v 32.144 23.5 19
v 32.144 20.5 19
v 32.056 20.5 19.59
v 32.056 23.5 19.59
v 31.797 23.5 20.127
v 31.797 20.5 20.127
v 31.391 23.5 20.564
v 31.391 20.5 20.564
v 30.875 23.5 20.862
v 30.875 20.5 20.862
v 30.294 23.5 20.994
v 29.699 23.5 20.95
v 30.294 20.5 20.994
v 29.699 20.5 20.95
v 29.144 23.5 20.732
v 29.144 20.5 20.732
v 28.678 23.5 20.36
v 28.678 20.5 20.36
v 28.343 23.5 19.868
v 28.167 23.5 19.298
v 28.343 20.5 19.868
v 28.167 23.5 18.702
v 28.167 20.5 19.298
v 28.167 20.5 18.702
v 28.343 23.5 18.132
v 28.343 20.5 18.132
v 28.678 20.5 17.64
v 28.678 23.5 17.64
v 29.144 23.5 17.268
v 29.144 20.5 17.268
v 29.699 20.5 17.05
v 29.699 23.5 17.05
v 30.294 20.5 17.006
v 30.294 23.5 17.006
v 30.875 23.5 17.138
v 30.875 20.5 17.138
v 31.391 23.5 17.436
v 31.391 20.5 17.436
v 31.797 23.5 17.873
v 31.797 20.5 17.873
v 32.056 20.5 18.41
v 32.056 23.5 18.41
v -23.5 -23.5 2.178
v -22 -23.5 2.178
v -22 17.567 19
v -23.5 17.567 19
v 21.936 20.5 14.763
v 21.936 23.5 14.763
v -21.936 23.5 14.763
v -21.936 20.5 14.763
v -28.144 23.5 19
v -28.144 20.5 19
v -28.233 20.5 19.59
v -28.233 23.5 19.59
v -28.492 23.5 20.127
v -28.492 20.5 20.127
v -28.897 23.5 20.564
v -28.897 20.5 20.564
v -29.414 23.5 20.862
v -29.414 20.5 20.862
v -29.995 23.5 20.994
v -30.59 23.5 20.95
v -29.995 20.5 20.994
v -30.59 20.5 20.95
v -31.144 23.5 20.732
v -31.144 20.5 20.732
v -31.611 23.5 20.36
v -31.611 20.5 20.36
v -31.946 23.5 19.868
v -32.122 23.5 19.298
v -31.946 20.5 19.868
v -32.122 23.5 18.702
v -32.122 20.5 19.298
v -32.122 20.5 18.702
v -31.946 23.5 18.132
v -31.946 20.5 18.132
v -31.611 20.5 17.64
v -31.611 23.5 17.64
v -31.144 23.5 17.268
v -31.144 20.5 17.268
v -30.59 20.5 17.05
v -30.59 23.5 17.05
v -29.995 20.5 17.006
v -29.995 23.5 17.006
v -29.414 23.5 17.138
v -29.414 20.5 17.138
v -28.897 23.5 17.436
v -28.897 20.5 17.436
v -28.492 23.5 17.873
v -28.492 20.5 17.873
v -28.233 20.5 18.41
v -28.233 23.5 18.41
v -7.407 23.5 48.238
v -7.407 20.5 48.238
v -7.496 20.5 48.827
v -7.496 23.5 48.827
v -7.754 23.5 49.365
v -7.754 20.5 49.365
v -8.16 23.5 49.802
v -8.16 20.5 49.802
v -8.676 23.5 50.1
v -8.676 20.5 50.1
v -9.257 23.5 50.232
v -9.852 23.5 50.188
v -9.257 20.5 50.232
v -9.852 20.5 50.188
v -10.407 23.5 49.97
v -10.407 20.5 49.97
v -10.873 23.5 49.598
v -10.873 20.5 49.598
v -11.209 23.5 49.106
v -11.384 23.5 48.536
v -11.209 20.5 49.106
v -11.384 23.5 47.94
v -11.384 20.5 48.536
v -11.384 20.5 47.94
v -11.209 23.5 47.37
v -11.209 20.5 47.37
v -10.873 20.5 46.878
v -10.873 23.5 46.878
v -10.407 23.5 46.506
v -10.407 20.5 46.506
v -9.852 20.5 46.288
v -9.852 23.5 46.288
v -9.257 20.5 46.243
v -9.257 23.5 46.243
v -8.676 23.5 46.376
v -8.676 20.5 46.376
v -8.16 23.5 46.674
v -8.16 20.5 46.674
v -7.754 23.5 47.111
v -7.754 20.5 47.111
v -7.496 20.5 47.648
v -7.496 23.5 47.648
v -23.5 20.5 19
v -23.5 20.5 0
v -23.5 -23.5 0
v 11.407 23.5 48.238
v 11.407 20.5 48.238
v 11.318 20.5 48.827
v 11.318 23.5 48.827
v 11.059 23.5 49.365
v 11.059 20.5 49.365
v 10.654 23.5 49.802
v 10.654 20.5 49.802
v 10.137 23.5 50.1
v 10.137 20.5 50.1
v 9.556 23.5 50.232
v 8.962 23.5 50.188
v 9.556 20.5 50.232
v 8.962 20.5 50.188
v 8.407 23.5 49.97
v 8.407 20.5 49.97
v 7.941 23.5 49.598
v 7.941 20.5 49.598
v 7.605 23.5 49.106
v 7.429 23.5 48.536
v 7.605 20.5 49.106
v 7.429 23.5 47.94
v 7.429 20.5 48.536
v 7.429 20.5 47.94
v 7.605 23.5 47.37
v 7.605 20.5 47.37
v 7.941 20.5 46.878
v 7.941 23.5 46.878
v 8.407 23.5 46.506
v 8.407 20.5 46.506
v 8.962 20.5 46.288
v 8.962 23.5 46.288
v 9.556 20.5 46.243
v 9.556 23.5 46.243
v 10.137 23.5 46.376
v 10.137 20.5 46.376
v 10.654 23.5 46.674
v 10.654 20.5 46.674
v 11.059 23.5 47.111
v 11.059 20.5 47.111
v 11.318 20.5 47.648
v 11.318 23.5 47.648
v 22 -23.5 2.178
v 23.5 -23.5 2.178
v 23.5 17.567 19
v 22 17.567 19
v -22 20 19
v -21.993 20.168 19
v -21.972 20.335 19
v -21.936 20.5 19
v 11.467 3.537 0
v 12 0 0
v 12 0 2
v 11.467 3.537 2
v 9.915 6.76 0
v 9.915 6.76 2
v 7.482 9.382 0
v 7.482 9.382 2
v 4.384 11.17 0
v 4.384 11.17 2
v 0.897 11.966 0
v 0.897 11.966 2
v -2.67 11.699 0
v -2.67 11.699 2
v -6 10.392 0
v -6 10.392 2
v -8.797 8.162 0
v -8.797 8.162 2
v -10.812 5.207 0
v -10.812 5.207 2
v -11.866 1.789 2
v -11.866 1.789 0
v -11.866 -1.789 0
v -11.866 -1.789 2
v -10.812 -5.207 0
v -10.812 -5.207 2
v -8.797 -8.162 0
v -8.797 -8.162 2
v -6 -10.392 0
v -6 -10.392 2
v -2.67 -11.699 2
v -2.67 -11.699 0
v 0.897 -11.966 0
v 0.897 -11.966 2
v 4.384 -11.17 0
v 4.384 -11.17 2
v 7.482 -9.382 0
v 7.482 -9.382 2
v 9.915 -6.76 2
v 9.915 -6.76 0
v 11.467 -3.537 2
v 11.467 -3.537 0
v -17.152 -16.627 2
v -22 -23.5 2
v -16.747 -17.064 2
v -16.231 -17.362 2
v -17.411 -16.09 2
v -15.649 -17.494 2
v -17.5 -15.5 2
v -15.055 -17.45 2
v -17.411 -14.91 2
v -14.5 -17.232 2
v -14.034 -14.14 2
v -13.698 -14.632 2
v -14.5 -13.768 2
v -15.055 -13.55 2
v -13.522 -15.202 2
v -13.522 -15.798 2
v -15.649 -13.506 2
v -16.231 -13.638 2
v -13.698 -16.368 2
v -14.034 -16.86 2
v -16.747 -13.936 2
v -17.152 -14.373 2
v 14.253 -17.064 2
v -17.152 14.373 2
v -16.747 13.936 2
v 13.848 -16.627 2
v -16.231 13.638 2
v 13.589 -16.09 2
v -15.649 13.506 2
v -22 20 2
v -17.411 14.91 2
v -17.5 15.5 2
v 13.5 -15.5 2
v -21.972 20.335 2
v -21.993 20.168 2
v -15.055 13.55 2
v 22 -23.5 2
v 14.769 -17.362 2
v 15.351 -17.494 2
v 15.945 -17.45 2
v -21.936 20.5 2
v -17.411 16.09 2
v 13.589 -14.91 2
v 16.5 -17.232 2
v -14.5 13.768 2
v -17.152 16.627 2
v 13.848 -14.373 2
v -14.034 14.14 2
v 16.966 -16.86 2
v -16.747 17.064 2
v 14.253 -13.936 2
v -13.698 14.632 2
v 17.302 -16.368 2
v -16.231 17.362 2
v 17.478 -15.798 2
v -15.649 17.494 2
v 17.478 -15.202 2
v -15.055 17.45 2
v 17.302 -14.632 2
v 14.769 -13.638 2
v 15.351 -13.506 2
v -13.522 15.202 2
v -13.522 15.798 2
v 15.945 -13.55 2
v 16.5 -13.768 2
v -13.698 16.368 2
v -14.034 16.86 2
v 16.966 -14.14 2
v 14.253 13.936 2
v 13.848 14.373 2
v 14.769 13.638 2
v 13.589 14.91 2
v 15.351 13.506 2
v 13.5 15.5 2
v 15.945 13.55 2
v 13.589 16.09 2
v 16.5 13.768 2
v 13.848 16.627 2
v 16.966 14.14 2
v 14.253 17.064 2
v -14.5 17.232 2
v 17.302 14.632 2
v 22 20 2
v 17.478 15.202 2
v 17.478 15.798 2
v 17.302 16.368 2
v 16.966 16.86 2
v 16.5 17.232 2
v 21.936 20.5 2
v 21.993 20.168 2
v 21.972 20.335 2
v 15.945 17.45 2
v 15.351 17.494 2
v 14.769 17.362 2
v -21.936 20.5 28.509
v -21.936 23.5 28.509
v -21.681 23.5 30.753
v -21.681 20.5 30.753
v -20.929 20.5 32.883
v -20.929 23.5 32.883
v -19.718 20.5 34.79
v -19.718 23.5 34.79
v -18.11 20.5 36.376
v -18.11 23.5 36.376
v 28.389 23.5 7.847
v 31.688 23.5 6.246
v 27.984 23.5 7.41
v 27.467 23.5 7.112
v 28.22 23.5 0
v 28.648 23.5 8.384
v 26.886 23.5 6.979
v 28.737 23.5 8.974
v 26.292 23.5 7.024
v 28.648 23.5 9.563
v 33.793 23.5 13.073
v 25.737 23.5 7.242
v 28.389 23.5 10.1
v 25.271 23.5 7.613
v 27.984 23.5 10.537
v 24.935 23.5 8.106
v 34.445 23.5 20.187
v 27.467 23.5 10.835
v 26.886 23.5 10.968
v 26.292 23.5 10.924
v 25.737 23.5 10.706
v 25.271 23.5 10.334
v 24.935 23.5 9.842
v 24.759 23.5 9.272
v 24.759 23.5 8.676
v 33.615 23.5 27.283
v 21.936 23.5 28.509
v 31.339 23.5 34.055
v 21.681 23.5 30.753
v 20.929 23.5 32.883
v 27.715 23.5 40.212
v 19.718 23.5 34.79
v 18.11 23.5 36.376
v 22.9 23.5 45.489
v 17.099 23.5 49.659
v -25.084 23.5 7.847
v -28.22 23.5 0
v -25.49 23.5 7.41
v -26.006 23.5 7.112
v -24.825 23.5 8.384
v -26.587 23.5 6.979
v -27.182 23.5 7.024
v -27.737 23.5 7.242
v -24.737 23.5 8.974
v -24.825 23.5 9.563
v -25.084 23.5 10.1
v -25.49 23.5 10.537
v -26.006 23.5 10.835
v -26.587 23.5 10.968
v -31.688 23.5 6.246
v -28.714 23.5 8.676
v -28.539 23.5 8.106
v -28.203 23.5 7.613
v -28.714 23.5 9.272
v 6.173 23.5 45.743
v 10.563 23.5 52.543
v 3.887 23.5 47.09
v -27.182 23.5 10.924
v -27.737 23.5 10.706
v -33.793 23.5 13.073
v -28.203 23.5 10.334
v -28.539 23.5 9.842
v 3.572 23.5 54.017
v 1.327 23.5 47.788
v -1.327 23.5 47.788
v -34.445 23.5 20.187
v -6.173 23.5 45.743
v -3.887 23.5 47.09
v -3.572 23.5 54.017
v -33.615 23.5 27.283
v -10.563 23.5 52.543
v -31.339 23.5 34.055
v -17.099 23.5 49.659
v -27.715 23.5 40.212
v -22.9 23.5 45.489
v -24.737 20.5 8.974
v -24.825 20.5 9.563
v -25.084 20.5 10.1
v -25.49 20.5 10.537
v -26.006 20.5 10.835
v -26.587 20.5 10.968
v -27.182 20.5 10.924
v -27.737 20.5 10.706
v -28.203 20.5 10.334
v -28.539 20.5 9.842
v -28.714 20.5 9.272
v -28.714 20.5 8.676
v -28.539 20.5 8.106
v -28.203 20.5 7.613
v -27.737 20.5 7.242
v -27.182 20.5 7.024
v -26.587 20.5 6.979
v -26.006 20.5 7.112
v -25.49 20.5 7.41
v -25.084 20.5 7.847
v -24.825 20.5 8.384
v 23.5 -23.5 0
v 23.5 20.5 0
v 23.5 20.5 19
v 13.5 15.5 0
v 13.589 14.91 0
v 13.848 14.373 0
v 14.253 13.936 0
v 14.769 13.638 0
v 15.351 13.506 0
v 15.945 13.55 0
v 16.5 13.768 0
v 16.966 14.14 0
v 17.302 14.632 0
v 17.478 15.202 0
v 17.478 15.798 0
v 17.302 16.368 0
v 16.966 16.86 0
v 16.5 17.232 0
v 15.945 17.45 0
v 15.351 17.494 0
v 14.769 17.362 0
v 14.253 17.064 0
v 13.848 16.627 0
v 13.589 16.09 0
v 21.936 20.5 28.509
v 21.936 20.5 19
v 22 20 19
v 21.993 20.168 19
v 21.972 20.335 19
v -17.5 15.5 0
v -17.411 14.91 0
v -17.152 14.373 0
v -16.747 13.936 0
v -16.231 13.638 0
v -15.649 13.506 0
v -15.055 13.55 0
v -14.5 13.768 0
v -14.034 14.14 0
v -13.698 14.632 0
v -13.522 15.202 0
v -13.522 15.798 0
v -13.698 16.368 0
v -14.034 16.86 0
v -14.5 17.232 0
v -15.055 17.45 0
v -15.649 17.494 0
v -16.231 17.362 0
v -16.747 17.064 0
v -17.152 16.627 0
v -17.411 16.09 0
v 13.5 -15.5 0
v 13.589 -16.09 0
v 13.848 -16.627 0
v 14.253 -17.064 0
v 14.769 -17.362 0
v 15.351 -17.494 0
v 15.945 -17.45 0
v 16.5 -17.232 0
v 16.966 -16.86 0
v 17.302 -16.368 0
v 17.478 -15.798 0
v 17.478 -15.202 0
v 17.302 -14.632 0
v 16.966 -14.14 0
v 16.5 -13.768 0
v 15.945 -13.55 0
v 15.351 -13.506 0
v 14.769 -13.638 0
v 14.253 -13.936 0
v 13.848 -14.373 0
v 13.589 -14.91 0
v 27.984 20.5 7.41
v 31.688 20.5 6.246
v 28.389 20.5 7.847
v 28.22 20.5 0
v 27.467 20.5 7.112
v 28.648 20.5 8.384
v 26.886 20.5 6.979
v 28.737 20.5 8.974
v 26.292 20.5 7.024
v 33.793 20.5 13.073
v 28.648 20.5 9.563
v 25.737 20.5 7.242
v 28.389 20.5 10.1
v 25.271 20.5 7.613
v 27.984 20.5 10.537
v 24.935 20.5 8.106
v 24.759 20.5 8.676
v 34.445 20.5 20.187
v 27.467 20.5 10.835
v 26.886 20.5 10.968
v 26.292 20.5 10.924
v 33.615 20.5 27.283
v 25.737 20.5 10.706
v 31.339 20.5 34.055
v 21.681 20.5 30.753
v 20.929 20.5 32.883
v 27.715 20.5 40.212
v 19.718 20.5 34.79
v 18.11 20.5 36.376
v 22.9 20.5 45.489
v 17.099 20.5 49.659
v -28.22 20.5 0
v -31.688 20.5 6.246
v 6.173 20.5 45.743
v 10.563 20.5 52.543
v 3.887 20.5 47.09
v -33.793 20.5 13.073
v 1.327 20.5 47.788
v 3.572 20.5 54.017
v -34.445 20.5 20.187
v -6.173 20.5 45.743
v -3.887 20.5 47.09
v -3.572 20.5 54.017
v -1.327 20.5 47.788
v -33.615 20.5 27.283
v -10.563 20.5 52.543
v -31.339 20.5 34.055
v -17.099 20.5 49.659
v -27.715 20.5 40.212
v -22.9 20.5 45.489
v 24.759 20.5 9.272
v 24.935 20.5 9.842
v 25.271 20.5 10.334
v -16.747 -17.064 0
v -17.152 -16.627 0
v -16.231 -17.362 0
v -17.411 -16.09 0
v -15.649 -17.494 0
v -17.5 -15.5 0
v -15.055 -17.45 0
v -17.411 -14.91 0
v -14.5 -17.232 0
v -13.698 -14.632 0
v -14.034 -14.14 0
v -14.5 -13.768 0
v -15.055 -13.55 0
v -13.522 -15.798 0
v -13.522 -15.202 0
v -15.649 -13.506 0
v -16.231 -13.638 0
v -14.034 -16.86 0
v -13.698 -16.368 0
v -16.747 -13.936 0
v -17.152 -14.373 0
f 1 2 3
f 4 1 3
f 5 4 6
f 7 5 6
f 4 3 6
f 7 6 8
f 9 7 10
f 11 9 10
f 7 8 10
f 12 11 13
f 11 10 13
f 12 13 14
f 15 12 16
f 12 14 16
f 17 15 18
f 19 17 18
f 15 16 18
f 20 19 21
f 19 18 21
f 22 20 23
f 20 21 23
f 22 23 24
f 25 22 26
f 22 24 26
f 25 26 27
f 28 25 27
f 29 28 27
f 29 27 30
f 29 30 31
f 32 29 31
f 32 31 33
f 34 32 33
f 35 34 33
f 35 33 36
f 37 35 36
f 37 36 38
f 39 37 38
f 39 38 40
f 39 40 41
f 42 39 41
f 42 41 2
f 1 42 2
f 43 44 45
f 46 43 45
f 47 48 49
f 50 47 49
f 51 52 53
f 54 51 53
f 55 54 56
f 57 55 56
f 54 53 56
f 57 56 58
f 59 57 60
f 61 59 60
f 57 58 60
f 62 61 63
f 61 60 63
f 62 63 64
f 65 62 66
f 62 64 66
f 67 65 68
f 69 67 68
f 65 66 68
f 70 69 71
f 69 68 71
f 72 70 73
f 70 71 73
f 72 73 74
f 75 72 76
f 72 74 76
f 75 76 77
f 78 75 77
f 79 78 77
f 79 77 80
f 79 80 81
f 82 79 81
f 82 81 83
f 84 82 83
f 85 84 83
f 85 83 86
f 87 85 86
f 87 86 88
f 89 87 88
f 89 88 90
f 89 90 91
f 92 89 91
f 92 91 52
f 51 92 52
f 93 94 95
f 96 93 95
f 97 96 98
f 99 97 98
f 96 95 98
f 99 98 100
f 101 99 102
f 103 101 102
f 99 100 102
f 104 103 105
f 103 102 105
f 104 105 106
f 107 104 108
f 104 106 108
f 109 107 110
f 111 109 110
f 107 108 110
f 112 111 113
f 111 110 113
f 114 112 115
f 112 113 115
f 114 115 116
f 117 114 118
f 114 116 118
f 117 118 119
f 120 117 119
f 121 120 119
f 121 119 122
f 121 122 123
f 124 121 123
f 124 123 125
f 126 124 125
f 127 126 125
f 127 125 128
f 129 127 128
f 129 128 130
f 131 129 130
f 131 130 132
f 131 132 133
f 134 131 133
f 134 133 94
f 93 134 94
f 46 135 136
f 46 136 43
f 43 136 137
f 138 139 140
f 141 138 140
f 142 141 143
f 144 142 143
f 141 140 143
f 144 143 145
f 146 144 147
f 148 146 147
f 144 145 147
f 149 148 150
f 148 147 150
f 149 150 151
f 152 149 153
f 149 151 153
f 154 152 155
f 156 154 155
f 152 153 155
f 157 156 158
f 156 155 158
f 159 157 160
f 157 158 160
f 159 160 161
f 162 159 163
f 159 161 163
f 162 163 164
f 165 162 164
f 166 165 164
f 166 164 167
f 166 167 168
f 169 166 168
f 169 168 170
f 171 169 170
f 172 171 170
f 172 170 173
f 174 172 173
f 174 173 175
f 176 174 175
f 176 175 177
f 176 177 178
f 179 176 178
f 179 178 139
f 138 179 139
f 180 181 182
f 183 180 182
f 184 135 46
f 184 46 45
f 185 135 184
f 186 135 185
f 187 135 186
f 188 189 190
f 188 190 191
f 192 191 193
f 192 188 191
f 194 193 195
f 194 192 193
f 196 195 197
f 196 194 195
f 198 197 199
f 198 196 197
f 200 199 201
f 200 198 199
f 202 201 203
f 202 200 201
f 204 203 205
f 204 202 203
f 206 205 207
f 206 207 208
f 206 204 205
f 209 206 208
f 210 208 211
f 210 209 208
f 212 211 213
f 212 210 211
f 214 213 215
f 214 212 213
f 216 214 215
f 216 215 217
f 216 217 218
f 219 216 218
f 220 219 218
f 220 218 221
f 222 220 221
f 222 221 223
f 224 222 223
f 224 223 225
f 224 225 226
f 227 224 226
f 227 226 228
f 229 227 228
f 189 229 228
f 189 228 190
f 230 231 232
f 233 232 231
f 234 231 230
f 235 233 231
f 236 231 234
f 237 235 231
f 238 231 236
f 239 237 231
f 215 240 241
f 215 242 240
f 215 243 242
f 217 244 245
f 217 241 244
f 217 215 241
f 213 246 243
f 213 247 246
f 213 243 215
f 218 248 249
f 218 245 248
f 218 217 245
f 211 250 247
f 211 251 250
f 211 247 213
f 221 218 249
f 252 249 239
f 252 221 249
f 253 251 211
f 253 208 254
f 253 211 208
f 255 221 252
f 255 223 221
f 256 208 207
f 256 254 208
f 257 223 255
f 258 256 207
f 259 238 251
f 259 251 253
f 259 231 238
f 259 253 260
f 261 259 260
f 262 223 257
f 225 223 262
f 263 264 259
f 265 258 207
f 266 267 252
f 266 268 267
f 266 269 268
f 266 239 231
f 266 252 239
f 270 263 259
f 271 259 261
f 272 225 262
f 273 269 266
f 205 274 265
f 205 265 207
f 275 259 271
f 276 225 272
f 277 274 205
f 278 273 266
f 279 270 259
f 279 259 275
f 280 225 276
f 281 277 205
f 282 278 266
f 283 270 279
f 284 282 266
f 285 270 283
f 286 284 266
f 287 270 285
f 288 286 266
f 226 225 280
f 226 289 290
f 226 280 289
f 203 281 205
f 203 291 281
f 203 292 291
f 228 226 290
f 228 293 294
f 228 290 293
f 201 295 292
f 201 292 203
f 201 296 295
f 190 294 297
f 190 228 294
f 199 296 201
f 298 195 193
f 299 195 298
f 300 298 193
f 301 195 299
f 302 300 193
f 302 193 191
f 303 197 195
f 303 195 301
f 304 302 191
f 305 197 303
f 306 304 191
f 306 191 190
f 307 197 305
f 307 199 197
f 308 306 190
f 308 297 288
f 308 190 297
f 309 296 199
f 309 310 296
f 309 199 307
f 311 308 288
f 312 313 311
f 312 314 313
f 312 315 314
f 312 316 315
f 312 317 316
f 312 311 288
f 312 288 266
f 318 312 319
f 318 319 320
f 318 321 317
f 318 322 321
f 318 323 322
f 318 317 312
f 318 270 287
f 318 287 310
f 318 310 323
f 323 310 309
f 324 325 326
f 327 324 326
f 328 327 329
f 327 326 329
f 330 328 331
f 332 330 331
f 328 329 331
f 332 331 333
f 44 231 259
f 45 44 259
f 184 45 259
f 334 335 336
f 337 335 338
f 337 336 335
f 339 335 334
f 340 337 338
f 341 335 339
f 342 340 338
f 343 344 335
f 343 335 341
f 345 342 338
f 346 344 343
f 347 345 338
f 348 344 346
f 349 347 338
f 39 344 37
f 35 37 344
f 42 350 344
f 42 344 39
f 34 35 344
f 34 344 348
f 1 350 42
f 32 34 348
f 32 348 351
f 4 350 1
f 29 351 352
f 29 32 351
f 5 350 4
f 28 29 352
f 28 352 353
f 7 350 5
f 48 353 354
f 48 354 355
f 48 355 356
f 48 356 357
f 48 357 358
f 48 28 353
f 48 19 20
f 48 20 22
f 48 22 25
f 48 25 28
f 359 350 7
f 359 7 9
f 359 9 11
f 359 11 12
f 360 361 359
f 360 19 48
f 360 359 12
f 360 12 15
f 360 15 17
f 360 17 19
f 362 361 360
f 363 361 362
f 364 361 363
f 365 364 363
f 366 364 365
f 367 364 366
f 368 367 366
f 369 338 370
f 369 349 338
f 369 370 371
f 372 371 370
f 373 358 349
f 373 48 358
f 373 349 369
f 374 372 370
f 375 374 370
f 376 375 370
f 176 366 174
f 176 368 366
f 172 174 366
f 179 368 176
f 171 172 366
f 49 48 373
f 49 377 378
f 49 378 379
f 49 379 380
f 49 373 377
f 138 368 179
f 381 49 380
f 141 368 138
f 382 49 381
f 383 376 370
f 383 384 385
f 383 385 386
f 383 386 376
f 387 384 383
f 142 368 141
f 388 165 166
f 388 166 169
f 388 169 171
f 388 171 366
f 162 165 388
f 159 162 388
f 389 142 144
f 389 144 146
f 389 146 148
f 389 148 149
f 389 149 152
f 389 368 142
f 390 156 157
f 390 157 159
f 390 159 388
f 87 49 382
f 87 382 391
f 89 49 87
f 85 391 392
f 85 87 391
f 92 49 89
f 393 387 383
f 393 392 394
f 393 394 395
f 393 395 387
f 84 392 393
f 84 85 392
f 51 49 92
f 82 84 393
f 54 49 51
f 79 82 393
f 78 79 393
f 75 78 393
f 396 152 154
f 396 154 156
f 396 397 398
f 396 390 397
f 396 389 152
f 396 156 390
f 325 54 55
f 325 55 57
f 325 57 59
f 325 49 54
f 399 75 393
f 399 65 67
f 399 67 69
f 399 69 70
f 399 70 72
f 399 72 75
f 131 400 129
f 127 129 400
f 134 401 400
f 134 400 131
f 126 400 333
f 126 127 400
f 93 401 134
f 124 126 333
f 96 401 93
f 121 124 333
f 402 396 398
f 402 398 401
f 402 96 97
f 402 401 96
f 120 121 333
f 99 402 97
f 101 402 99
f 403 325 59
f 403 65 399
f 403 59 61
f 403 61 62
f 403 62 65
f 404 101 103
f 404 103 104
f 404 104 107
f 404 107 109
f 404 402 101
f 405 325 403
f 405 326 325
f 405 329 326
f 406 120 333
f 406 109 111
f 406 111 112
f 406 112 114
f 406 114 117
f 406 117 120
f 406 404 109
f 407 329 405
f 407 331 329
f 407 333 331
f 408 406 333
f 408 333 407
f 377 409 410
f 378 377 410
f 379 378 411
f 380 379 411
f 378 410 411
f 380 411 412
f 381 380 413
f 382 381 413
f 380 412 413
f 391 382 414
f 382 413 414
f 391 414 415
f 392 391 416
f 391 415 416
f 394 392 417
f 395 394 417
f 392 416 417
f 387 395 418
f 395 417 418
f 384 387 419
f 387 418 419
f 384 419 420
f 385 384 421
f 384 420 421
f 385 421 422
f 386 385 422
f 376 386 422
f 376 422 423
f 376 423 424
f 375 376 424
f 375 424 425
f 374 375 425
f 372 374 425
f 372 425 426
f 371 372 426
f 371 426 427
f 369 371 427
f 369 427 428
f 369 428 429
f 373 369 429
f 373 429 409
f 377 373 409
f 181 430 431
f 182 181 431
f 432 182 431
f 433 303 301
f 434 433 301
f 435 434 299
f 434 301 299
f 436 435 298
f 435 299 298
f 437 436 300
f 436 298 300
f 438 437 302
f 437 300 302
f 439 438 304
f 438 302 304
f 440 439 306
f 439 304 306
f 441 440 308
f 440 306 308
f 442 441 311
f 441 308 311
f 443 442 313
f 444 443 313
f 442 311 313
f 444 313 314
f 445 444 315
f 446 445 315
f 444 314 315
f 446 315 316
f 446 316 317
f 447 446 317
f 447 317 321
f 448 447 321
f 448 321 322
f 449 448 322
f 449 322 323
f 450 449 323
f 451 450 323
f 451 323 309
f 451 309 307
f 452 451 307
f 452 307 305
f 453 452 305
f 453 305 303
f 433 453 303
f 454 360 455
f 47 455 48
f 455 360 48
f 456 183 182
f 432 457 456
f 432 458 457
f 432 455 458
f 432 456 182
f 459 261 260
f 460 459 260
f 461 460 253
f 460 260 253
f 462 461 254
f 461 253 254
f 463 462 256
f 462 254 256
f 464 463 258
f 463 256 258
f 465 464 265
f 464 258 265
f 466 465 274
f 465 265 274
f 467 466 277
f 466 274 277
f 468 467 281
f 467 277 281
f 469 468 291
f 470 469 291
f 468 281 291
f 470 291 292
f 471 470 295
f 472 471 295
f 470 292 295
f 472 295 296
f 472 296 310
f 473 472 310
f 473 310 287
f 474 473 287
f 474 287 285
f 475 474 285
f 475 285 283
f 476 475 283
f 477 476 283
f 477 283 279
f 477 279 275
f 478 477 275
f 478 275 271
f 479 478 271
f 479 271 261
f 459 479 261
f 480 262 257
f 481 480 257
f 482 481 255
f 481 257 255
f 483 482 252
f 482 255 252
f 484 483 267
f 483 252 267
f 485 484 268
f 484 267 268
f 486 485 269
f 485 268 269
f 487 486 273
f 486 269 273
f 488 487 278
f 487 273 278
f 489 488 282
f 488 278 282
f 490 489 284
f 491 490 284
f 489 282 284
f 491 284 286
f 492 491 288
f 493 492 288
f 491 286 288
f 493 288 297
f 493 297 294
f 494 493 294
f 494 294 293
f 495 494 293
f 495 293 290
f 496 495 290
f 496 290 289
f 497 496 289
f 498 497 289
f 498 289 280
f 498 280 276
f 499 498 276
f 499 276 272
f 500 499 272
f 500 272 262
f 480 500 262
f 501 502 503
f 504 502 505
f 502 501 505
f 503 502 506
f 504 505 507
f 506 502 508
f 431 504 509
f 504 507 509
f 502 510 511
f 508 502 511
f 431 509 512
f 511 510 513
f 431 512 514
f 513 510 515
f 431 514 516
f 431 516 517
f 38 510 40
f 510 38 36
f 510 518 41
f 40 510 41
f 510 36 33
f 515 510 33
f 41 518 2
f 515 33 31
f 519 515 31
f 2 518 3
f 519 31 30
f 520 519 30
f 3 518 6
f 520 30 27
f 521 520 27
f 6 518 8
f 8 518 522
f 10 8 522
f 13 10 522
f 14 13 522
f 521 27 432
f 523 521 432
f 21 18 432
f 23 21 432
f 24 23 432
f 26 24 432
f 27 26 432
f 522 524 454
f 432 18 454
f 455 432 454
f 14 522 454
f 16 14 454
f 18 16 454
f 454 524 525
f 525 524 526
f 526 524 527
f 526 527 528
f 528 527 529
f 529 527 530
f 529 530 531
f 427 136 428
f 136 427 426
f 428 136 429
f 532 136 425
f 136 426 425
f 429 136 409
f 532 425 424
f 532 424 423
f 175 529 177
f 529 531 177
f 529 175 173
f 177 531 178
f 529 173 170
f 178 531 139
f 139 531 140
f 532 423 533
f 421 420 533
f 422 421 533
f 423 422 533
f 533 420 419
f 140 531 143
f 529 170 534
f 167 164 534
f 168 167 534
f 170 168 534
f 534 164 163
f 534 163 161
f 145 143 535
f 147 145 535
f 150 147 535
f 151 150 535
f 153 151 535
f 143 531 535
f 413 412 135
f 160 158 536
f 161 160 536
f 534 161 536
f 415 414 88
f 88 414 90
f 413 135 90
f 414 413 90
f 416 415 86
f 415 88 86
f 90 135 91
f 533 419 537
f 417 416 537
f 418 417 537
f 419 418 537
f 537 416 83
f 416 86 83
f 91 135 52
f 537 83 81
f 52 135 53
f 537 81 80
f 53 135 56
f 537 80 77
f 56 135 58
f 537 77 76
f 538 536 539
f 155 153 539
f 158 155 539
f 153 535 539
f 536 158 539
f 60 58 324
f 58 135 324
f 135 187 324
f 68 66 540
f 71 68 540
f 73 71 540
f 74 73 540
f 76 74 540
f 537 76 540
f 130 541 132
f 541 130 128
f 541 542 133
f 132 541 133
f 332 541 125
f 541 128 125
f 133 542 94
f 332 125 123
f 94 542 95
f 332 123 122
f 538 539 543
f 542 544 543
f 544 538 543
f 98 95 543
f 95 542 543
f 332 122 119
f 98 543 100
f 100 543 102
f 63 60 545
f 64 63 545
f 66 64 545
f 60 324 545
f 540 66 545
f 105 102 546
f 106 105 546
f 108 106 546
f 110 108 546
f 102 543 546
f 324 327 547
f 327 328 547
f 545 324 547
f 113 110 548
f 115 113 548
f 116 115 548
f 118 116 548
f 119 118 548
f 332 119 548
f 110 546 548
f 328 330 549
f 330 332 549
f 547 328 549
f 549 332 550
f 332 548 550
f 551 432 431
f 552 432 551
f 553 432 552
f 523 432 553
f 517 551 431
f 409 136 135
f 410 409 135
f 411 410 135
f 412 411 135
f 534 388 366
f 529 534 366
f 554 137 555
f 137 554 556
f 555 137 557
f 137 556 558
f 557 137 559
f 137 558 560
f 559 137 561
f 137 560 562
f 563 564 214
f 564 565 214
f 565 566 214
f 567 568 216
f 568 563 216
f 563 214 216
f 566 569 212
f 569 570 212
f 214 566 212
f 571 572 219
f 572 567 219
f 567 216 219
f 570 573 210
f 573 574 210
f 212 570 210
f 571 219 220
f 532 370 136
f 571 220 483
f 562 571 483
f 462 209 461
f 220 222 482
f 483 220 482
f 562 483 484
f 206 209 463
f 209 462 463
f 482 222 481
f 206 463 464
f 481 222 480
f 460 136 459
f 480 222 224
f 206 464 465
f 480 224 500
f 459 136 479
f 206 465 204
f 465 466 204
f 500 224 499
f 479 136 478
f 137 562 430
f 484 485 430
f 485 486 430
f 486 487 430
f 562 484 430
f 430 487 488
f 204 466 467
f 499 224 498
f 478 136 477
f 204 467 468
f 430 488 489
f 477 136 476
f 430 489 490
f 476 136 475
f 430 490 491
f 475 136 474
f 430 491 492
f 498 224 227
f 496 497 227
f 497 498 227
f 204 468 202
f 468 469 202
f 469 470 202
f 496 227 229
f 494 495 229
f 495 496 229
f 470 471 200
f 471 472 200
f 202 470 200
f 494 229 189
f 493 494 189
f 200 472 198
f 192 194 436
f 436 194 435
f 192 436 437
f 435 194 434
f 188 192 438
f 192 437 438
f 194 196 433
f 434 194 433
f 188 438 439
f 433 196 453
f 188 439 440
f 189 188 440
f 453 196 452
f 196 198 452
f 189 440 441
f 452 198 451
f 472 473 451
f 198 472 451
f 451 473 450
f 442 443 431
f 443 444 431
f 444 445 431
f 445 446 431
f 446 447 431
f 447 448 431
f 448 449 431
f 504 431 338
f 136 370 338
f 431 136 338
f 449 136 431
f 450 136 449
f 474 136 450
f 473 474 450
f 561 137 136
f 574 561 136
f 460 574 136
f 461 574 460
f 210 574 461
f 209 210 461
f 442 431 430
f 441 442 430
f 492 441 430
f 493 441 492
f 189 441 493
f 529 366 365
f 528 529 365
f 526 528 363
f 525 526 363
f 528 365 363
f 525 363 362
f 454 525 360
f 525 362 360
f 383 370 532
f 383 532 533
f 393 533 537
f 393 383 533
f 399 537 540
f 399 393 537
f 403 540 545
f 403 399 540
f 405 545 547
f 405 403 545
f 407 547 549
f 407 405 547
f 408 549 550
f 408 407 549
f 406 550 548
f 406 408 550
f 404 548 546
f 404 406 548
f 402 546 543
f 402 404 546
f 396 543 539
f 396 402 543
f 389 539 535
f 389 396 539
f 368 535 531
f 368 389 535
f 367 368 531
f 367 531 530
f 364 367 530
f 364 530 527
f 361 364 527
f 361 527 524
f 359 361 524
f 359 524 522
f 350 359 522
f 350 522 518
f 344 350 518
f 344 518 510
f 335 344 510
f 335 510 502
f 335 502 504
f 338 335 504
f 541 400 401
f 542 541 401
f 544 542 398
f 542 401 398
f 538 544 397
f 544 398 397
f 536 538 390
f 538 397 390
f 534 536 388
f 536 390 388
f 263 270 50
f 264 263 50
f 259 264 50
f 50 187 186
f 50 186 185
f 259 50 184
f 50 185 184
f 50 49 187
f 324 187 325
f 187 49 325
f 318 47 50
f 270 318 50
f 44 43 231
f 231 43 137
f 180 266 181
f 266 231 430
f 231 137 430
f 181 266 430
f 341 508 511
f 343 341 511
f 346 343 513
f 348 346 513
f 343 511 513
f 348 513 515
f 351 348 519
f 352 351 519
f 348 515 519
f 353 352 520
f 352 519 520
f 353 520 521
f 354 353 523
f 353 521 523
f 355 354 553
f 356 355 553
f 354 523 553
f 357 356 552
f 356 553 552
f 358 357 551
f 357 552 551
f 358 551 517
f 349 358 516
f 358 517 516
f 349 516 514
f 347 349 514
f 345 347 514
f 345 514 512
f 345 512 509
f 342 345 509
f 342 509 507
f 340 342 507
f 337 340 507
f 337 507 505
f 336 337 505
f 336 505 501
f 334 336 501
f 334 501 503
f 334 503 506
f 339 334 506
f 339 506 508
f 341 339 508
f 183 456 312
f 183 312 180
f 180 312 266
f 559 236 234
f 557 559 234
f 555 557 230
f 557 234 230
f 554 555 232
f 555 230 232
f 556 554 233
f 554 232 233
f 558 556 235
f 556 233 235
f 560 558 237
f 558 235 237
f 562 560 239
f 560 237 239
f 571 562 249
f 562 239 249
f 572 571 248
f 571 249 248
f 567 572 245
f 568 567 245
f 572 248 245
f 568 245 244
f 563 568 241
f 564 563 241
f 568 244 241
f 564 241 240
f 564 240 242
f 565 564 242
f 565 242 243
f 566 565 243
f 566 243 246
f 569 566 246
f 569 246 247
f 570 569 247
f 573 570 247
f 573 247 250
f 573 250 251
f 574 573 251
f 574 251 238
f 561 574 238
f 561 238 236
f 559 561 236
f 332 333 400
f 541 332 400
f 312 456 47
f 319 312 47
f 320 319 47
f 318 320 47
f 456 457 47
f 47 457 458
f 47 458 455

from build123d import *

# Parameters (mm, degrees)
F1_DEPTH         = 19
F0_W             = 44.0000004768
F0_H             = 45.5000002384
F0_R             = 12
F2_DEPTH         = 2
F3_D             = 4
F5_DEPTH         = 50
F7_DEPTH         = 3
F8_D             = 4
F9_R             = 2
F10_R            = 34.4476203659
F10_W            = 47
F10_H            = 19
F6_W             = 47
F6_H             = 19
F11_DEPTH        = 3
F13_DEPTH        = 25
F14_D            = 4
F14_DEPTH        = 6
F14_TIP          = 1.2017212381
F14_ON_F12_D     = 4
F14_ON_F12_DEPTH = 6
F14_ON_F12_TIP   = 1.2017212381


# Not quite as in the source:
# - a feature names something its author has since deleted; it is built from what else it names


with BuildPart() as f1:
    # F0 (on Top) → F1 (new body)
    with BuildSketch(Plane.XY):
        Polygon((23.5, -23.5), (23.5, 23.5), (-23.5, 23.5), (-23.5, -23.5), (-22.0000002384, -23.5), (-22.0000002384, 22.0000002384), (22.0000002384, 22.0000002384), (22.0000002384, -23.5), align=None)
    extrude(amount=F1_DEPTH)

    # F0 (on Top) → F2 (join)
    with BuildSketch(Plane.XY):
        with Locations((0, -0.7499998808)):
            Rectangle(F0_W, F0_H)
        Circle(F0_R, mode=Mode.SUBTRACT)
    extrude(amount=F2_DEPTH)

    # F3 (through all)
    with Locations(Plane(origin=(0, 0, 0), x_dir=(1, 0, 0), z_dir=(0, 0, -1))):
        with Locations((-15.5, -15.5), (15.5, -15.5), (15.5, 15.5), (-15.5, 15.5)):
            Hole(F3_D / 2)

    # F4 (on face) → F5 (cut)
    with BuildSketch(Plane.YZ.offset(23.5)):
        Polygon((-23.5, 19), (-23.5, 2.1775800269), (17.5668895245, 19), align=None)
    extrude(amount=-F5_DEPTH, mode=Mode.SUBTRACT)

    # F6 (on face) → F7 (join)
    with BuildSketch(Plane(origin=(0, 23.5, 0), x_dir=(-1, 0, 0), z_dir=(0, 1, 0))):
        with BuildLine():
            Line((-23.5, 19), (-25.1444590574, 19))
            ThreePointArc((-25.1444590574, 19), (-28.6799929633, 17.5355339059), (-30.1444590574, 14))
            Line((-30.1444590574, 14), (-30.1444590574, 5))
            ThreePointArc((-30.1444590574, 5), (-28.6799929633, 1.4644660941), (-25.1444590574, 0))
            Line((-25.1444590574, 0), (-23.5, 0))
            Line((-23.5, 0), (-23.5, 19))
        make_face()
        with BuildLine():
            Line((24.0855421871, 19), (23.5, 19))
            Line((23.5, 19), (23.5, 0))
            Line((23.5, 0), (24.0855421871, 0))
            ThreePointArc((24.0855421871, 0), (27.621076093, 1.4644660941), (29.0855421871, 5))
            Line((29.0855421871, 5), (29.0855421871, 14))
            ThreePointArc((29.0855421871, 14), (27.621076093, 17.5355339059), (24.0855421871, 19))
        make_face()
    extrude(amount=-F7_DEPTH)

    # F8 (through all)
    with Locations(Plane(origin=(0, 23.5, 0), x_dir=(-1, 0, 0), z_dir=(0, 1, 0))):
        with Locations((-26.7366040498, 8.9737372473), (28.2633959502, 9.5)):
            Hole(F8_D / 2)

    # F9
    f9_edges = [f1.edges().sort_by_distance(p)[0] for p in [
        (22, 22, 10.5),
        (-22, 22, 10.5),
    ]]
    fillet(f9_edges, radius=F9_R)

    # F10 (on face) + F6 (on face) → F11 (join)
    with BuildSketch(Plane(origin=(0, 23.5, 0), x_dir=(-1, 0, 0), z_dir=(0, 1, 0))):
        with Locations((0, 19.7549201548)):
            Circle(F10_R)
        with Locations((0, 9.5)):
            Rectangle(F10_W, F10_H, mode=Mode.SUBTRACT)
    with BuildSketch(Plane(origin=(0, 23.5, 0), x_dir=(-1, 0, 0), z_dir=(0, 1, 0))):
        with Locations((0, 9.5)):
            Rectangle(F6_W, F6_H)
    extrude(amount=-F11_DEPTH)

    # F12 (on face) → F13 (cut)
    with BuildSketch(Plane(origin=(0, 23.5, 0), x_dir=(-1, 0, 0), z_dir=(0, 1, 0))):
        with BuildLine():
            ThreePointArc((-18.1099253817, 36.3759554919), (-20.9291093364, 32.8831264718), (-21.9364919731, 28.5090170817))
            Line((-21.9364919731, 28.5090170817), (-21.9364919731, 14.7631261498))
            Line((-21.9364919731, 14.7631261498), (21.9364919731, 14.7631261498))
            Line((21.9364919731, 14.7631261498), (21.9364919731, 28.5090170817))
            ThreePointArc((21.9364919731, 28.5090170817), (20.9291093364, 32.8831264718), (18.1099253817, 36.3759554919))
            Line((18.1099253817, 36.3759554919), (6.1734334086, 45.7428952702))
            ThreePointArc((6.1734334086, 45.7428952702), (0, 47.87595686), (-6.1734334086, 45.7428952702))
            Line((-6.1734334086, 45.7428952702), (-18.1099253817, 36.3759554919))
        make_face()
        with BuildLine():
            Line((28.2202352675, 0), (-28.2202352675, 0))
            ThreePointArc((-28.2202352675, 0), (0, -14.6927002111), (28.2202352675, 0))
        make_face()
    extrude(amount=-F13_DEPTH, mode=Mode.SUBTRACT)

    # F14
    with Locations(Plane(origin=(0, 23.5, 0), x_dir=(-1, 0, 0), z_dir=(0, 1, 0))):
        with Locations((-30.1444590574, 19), (-26.7366040498, 8.9737372473), (26.7366040498, 8.9737372473), (30.1444590574, 19)):
            Hole(F14_D / 2, depth=F14_DEPTH)
            with Locations((0, 0, -(F14_DEPTH + F14_TIP / 2))):  # 118° drill point
                Cone(0, F14_D / 2, F14_TIP, mode=Mode.SUBTRACT)

    # F14 on F12
    with Locations(Plane(origin=(0, 23.5, 0), x_dir=(-1, 0, 0), z_dir=(0, 1, 0))):
        with Locations((9.4067957252, 48.2378602028), (-9.4067957252, 48.2378602028)):
            Hole(F14_ON_F12_D / 2, depth=F14_ON_F12_DEPTH)
            with Locations((0, 0, -(F14_ON_F12_DEPTH + F14_ON_F12_TIP / 2))):  # 118° drill point
                Cone(0, F14_ON_F12_D / 2, F14_ON_F12_TIP, mode=Mode.SUBTRACT)


solid = f1.part
